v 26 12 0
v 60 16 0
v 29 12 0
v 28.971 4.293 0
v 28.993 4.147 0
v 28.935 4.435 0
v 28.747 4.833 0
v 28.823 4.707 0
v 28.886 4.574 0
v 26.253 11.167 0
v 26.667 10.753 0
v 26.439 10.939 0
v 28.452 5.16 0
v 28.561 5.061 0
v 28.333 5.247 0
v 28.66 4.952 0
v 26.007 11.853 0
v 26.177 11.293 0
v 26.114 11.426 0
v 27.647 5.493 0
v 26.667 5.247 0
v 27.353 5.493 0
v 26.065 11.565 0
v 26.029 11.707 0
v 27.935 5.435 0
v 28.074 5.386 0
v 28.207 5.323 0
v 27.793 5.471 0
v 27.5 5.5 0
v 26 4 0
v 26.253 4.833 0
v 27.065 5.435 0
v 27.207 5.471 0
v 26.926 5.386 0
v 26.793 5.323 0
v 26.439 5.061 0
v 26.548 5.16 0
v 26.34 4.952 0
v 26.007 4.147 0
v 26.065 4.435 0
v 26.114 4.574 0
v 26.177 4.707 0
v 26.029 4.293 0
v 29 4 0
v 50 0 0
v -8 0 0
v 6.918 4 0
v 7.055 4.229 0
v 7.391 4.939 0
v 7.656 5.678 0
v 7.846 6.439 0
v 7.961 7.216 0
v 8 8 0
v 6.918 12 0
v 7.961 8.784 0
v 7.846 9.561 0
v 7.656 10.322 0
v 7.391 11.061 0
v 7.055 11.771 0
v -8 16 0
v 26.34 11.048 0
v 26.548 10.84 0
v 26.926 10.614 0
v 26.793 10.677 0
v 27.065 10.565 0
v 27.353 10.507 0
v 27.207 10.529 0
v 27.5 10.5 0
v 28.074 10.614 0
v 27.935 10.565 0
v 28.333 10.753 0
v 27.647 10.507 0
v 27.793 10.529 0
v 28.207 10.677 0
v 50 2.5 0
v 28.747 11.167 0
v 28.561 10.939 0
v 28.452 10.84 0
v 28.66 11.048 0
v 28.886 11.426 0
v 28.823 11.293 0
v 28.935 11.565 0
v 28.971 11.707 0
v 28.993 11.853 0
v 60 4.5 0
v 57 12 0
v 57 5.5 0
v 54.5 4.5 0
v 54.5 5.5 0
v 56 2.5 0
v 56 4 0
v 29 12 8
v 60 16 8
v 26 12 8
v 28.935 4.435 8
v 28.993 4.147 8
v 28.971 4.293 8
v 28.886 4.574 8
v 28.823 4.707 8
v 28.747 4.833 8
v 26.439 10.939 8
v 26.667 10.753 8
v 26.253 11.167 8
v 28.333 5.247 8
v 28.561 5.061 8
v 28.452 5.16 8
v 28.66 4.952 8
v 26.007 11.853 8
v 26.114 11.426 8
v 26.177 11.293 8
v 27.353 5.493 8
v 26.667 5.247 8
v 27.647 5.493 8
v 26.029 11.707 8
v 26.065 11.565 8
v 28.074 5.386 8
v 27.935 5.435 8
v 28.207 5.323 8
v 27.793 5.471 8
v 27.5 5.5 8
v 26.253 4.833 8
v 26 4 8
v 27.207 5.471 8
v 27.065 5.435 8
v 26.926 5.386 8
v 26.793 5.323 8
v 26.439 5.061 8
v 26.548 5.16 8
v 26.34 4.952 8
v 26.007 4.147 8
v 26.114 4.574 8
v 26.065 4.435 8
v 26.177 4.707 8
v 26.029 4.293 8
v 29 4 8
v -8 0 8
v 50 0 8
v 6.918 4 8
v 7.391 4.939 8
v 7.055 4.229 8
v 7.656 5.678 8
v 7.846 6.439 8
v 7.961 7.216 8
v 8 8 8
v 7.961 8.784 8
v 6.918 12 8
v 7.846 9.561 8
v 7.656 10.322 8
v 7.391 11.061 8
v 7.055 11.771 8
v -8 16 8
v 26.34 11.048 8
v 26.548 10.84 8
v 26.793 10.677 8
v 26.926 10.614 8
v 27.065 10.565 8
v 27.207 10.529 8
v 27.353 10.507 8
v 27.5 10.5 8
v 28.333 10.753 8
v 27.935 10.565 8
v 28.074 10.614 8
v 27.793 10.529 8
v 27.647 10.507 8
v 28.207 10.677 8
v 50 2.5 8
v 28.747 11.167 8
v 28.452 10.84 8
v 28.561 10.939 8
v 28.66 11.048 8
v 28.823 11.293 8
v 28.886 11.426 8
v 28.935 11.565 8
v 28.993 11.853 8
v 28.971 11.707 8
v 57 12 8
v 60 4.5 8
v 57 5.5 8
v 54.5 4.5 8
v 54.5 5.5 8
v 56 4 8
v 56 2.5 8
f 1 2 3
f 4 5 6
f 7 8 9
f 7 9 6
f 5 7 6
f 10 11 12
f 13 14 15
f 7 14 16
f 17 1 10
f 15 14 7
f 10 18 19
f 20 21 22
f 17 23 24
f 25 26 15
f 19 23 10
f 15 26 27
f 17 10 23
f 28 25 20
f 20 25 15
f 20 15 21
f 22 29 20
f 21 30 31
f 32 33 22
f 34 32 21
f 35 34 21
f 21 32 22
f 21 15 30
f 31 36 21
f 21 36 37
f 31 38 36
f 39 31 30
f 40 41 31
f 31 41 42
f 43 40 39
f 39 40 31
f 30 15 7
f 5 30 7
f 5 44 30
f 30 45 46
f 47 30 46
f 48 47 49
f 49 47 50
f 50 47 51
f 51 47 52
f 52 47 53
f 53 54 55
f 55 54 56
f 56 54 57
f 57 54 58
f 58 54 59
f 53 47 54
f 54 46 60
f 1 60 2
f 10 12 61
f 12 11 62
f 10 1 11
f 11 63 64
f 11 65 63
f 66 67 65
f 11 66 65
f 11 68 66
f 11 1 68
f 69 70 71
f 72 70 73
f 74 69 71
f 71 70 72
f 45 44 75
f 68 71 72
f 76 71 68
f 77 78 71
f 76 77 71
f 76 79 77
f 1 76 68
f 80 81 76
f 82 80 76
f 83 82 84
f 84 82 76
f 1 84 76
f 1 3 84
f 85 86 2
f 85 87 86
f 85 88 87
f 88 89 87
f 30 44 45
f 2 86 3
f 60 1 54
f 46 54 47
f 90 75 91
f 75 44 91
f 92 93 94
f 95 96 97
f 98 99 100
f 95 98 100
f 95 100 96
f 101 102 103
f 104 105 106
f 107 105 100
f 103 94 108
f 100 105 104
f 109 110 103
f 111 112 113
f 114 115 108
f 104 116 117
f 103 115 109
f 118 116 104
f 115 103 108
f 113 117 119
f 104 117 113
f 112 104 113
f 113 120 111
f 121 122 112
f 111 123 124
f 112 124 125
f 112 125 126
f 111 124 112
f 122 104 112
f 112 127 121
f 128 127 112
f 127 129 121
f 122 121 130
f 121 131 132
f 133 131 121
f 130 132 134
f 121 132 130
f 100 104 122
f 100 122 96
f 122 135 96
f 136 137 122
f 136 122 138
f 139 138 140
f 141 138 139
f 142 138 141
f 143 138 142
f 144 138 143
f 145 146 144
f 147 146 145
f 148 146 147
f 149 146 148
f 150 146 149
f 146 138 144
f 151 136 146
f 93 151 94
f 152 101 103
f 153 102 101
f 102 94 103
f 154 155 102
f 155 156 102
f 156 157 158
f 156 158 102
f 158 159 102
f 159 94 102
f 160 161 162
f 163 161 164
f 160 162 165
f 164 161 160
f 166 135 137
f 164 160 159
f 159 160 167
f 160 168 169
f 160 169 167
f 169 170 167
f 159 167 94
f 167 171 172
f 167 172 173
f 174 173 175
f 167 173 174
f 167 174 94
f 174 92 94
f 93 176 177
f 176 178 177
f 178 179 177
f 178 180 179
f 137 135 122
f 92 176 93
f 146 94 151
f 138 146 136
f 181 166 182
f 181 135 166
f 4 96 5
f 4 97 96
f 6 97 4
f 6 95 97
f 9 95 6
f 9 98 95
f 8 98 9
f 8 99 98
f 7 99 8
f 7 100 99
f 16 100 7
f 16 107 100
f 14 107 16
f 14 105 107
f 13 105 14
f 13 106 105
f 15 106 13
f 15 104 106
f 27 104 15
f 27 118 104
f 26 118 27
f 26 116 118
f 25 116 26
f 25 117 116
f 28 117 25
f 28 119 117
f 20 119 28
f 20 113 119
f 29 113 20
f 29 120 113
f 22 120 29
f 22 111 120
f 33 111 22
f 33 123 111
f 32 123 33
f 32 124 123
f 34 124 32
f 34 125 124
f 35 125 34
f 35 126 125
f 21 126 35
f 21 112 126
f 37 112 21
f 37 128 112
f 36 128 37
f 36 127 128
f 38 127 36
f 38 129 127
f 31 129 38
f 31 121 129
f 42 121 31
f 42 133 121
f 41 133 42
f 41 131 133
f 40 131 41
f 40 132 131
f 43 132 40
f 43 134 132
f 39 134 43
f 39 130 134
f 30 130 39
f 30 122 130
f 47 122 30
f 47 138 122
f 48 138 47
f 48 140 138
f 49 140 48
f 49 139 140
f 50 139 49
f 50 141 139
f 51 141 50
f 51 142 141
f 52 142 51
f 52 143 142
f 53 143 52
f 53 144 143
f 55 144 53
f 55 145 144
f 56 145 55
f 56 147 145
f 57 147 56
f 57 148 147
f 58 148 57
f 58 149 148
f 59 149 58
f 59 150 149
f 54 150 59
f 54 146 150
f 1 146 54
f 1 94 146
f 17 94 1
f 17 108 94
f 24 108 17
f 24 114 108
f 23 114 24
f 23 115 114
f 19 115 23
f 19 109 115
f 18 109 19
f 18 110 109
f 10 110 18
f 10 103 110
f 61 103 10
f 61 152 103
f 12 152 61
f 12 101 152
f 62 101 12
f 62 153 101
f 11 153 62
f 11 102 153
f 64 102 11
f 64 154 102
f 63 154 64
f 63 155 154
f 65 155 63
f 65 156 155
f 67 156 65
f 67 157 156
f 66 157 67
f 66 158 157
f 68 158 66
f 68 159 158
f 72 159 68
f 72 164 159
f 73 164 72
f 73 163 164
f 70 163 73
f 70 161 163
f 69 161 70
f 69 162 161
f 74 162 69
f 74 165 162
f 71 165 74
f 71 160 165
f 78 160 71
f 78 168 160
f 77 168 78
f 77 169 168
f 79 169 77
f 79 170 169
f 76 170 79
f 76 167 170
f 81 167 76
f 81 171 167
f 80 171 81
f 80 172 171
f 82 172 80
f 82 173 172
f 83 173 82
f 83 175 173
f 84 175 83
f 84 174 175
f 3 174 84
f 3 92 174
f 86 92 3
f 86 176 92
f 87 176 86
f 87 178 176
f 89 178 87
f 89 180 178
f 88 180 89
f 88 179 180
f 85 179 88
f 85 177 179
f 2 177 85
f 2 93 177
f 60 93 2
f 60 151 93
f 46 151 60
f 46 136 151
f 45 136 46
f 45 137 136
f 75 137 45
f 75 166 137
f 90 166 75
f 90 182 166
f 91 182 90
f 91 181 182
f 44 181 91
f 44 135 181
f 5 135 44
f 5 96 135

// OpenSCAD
// Pinch clamp for silicone tubing (up to 6.4 mm across)
// Printed flat: 2-D profile in XY plane, extruded 8 mm along Z

// === Dimensions (mm) ===
extrusion_height = 8;          // Extrusion height along Z
lower_jaw_x_start = 0;         // Lower jaw x start
lower_jaw_x_end = 50;          // Lower jaw x end (before tongue)
lower_jaw_y_start = 0;         // Lower jaw y start
lower_jaw_y_end = 4;           // Lower jaw y end
tongue_x_start = 50;           // Tongue x start
tongue_x_end = 56;             // Tongue x end
tongue_y_start = 2.5;          // Tongue y start
tongue_y_end = 4;              // Tongue y end
upper_jaw_x_start = 0;         // Upper jaw x start
upper_jaw_x_end = 60;          // Upper jaw x end
upper_jaw_y_start = 12;        // Upper jaw y start
upper_jaw_y_end = 16;          // Upper jaw y end
hinge_center_x = 0;            // Hinge center x
hinge_center_y = 8;            // Hinge center y
hinge_inner_r = 7.2;           // Hinge inner radius
hinge_outer_r = 8;             // Hinge outer radius
ridge_radius = 1.5;            // Pinch ridge radius
ridge_x = 27.5;                // Ridge x position
lower_ridge_y = 4;             // Lower jaw ridge center y
upper_ridge_y = 12;            // Upper jaw ridge center y
latch_leg_x_start = 57;        // Latch leg x start
latch_leg_x_end = 60;          // Latch leg x end
latch_leg_y_start = 4.5;       // Latch leg y start
latch_leg_y_end = 12;          // Latch leg y end
latch_nose_x_start = 54.5;     // Latch nose x start
latch_nose_x_end = 57;         // Latch nose x end
latch_nose_y_start = 4.5;      // Latch nose y start
latch_nose_y_end = 5.5;        // Latch nose y end

$fn = 64;

linear_extrude(height = extrusion_height, convexity = 10) {
    union() {
        // Lower jaw bar
        translate([lower_jaw_x_start, lower_jaw_y_start])
            square([lower_jaw_x_end - lower_jaw_x_start, lower_jaw_y_end - lower_jaw_y_start]);

        // Tongue
        translate([tongue_x_start, tongue_y_start])
            square([tongue_x_end - tongue_x_start, tongue_y_end - tongue_y_start]);

        // Upper jaw bar
        translate([upper_jaw_x_start, upper_jaw_y_start])
            square([upper_jaw_x_end - upper_jaw_x_start, upper_jaw_y_end - upper_jaw_y_start]);

        // Hinge: half-ring on x < 0 side, centered at (0, 8)
        // Outer half-circle (x < 0)
        translate([hinge_center_x, hinge_center_y])
            rotate([0, 0, 0])
            circle(r = hinge_outer_r);
        // Inner half-circle cutout (x < 0)
        translate([hinge_center_x, hinge_center_y])
            circle(r = hinge_inner_r);
        // Block the right half (x > 0) of the hinge area
        translate([-hinge_outer_r, hinge_center_y - hinge_outer_r])
            square([hinge_outer_r, 2 * hinge_outer_r]);

        // Lower jaw pinch ridge: half-round on inner face (top side, facing upper jaw)
        // Centered at (ridge_x, lower_ridge_y), radius ridge_radius
        // The ridge sits on the top edge of the lower jaw (y = 4)
        translate([ridge_x, lower_ridge_y])
            circle(r = ridge_radius);

        // Upper jaw pinch ridge: half-round on inner face (bottom side, facing lower jaw)
        // Centered at (ridge_x, upper_ridge_y), radius ridge_radius
        // The ridge sits on the bottom edge of the upper jaw (y = 12)
        translate([ridge_x, upper_ridge_y])
            circle(r = ridge_radius);

        // Latch leg
        translate([latch_leg_x_start, latch_leg_y_start])
            square([latch_leg_x_end - latch_leg_x_start, latch_leg_y_end - latch_leg_y_start]);

        // Latch nose
        translate([latch_nose_x_start, latch_nose_y_start])
            square([latch_nose_x_end - latch_nose_x_start, latch_nose_y_end - latch_nose_y_start]);
    }

    // Cut out the right half of the hinge to make it a half-ring on x < 0 only
    // This is handled by the union above, but we need to ensure the hinge is only on x < 0
    // The block above handles this by adding a square that covers x > 0 of the hinge area
}
